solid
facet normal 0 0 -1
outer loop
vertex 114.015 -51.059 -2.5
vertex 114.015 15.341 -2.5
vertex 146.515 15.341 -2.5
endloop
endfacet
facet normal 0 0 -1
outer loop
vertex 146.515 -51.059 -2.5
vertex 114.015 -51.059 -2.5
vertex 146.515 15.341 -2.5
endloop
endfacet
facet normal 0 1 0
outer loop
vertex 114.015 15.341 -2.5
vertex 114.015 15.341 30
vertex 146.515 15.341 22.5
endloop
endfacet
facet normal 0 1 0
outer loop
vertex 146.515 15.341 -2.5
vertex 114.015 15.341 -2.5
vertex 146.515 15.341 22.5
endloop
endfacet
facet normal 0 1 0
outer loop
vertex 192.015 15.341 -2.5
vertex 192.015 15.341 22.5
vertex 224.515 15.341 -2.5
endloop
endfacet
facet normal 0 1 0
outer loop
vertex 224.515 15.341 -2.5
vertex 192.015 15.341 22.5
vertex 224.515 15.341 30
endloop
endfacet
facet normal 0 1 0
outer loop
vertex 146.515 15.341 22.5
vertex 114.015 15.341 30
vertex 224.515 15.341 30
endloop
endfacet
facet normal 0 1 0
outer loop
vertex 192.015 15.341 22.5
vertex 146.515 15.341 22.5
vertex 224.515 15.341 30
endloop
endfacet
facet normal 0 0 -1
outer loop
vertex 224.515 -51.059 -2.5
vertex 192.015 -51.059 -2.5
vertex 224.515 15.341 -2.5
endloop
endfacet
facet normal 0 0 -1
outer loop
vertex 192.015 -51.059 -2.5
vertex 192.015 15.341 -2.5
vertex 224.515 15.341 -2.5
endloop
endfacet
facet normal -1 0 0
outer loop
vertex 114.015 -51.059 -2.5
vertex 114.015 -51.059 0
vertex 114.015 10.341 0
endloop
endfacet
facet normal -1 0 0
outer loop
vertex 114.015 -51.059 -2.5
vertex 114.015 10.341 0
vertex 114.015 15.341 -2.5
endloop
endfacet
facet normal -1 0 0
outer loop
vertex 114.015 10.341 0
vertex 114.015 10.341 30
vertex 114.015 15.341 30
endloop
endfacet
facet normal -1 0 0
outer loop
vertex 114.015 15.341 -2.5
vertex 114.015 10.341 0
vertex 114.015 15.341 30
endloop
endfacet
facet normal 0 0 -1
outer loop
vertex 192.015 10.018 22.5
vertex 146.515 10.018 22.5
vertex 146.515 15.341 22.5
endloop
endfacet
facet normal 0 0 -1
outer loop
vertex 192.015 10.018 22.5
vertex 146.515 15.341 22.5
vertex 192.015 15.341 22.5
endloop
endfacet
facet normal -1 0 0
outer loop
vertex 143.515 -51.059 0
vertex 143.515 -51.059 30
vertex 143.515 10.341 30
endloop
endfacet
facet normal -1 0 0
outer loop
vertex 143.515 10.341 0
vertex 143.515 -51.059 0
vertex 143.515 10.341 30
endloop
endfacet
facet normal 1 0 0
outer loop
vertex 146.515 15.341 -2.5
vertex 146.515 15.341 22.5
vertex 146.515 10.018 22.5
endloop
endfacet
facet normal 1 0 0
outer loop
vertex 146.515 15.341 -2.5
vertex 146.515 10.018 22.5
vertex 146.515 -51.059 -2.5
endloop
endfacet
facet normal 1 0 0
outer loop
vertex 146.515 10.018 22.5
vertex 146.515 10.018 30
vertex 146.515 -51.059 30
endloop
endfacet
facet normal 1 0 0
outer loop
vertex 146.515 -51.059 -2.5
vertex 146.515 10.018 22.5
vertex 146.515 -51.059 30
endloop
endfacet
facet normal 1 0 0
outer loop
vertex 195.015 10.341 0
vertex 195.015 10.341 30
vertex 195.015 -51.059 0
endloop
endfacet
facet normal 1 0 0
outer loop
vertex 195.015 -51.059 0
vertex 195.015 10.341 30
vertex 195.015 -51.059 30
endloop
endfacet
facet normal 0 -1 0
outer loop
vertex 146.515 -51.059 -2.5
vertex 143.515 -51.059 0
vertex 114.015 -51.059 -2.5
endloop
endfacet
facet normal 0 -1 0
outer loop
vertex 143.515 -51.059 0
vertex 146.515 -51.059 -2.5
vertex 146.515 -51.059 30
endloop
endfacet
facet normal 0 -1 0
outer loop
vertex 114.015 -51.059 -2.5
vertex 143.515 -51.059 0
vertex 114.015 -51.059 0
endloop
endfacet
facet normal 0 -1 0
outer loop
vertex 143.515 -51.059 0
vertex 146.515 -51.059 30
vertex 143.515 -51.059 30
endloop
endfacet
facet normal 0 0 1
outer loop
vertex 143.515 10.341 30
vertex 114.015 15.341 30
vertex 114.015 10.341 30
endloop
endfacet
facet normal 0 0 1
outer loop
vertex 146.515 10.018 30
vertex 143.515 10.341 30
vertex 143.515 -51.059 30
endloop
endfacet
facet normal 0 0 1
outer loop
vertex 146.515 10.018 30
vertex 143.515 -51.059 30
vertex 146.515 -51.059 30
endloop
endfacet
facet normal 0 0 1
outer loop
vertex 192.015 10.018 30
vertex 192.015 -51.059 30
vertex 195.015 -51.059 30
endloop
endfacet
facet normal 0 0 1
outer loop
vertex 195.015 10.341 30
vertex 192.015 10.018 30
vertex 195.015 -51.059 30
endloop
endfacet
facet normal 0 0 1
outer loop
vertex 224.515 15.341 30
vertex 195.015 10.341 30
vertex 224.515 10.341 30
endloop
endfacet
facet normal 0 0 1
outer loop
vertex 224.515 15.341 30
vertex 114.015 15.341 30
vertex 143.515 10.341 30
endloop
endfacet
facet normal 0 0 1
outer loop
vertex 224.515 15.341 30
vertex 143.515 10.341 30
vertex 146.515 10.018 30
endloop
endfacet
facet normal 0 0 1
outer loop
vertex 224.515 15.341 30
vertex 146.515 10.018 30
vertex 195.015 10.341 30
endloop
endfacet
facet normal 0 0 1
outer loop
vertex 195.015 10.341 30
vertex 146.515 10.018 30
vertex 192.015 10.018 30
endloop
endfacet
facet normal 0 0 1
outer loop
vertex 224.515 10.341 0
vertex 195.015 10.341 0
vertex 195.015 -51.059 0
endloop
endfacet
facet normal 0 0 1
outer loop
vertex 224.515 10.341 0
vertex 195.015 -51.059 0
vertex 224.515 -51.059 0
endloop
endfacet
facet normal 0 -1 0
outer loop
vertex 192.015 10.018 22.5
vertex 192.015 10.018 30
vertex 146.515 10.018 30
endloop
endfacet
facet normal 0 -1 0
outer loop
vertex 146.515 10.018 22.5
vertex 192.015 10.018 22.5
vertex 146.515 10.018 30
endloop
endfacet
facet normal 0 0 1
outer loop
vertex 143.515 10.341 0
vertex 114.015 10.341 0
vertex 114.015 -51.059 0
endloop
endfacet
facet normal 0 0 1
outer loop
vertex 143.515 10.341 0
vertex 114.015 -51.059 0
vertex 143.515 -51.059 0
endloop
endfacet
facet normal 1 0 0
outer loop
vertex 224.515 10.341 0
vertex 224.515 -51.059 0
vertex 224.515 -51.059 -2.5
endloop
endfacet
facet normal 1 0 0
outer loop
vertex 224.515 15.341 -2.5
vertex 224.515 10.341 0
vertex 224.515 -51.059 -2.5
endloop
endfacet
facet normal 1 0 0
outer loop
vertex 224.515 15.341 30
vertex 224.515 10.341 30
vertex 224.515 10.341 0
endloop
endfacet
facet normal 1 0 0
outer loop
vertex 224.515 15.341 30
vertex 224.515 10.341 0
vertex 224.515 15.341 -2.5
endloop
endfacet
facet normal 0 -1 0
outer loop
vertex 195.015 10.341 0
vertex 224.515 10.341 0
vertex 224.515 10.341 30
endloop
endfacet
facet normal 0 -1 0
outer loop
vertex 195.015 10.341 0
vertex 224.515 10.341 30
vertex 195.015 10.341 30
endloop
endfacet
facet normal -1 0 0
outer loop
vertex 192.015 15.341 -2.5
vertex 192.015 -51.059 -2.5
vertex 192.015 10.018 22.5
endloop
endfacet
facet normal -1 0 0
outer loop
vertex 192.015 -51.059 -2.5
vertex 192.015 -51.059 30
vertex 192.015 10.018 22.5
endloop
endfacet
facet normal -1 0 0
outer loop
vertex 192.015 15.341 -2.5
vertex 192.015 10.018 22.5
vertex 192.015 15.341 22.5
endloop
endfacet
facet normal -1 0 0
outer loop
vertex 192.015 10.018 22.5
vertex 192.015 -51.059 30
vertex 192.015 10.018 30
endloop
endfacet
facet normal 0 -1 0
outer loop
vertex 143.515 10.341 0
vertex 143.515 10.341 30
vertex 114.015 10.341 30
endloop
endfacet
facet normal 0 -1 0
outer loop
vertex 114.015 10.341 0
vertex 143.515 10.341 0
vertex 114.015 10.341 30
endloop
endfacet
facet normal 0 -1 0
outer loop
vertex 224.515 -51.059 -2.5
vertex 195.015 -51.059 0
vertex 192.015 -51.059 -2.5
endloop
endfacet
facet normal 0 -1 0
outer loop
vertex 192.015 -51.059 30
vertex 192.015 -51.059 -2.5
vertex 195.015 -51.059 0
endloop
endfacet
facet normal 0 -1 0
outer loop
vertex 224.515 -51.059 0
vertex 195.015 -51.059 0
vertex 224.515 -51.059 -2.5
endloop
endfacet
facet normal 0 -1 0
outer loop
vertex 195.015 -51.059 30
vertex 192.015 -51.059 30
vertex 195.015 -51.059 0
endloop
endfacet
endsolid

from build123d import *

# Parameters (mm, degrees)
F1_DEPTH = 6.5
F2_DEPTH = 30
F3_DEPTH = 2.5
F0_W     = 29.5
F0_H     = 61.4
F4_DEPTH = 2.5
F5_W     = 45.5
F5_H     = 5.322864
F6_DEPTH = 25


with BuildPart() as f1:
    # F0 (on Top) → F1 (new body)
    with BuildSketch(Plane.XY):
        Polygon((-58.032156, 36.652669), (-58.032156, 30.152669), (-64.532156, 30.152669), (-64.532156, 23.652669), (-58.032156, 23.652669), (-58.032156, 17.152669), (-64.532156, 17.152669), (-64.532156, 10.652669), (-58.032156, 10.652669), (-58.032156, 4.152669), (-64.532156, 4.152669), (-64.532156, -2.347331), (-58.032156, -2.347331), (-58.032156, -8.847331), (-64.532156, -8.847331), (-64.532156, -15.347331), (-58.032156, -15.347331), (-58.032156, -21.847331), (-64.532156, -21.847331), (-64.532156, -28.347331), (-58.032156, -28.347331), (-58.032156, -34.847331), (-64.532156, -34.847331), (-64.532156, -41.347331), (-58.032156, -41.347331), (-58.032156, -53.445331), (58.967844, -53.445331), (58.967844, -41.347331), (65.467844, -41.347331), (65.467844, -34.847331), (58.967844, -34.847331), (58.967844, -28.347331), (65.467844, -28.347331), (65.467844, -21.847331), (58.967844, -21.847331), (58.967844, -15.347331), (65.467844, -15.347331), (65.467844, -8.847331), (58.967844, -8.847331), (58.967844, -2.347331), (65.467844, -2.347331), (65.467844, 4.152669), (58.967844, 4.152669), (58.967844, 10.652669), (65.467844, 10.652669), (65.467844, 17.152669), (58.967844, 17.152669), (58.967844, 23.652669), (58.967844, 30.152669), (52.467844, 30.152669), (52.467844, 36.652669), (45.967844, 36.652669), (45.967844, 30.152669), (39.467844, 30.152669), (39.467844, 36.652669), (32.967844, 36.652669), (32.967844, 30.152669), (26.467844, 30.152669), (26.467844, 36.652669), (19.967844, 36.652669), (19.967844, 30.152669), (13.467844, 30.152669), (13.467844, 36.652669), (6.967844, 36.652669), (6.967844, 30.152669), (0.467844, 30.152669), (0.467844, 36.652669), (-6.032156, 36.652669), (-6.032156, 30.152669), (-12.532156, 30.152669), (-12.532156, 36.652669), (-19.032156, 36.652669), (-19.032156, 30.152669), (-25.532156, 30.152669), (-25.532156, 36.652669), (-32.032156, 36.652669), (-32.032156, 30.152669), (-38.532156, 30.152669), (-38.532156, 36.652669), (-45.032156, 36.652669), (-45.032156, 30.152669), (-51.532156, 30.152669), (-51.532156, 36.652669), align=None)
    extrude(amount=F1_DEPTH)


with BuildPart() as f2:
    # F0 (on Top) → F2 (new body)
    with BuildSketch(Plane.XY):
        Polygon((224.515274, 15.340945), (114.015274, 15.340945), (114.015274, 10.340945), (143.515274, 10.340945), (143.515274, -51.059055), (146.515274, -51.059055), (146.515274, 10.018081), (192.015274, 10.018081), (192.015274, -51.059055), (195.015274, -51.059055), (195.015274, 10.340945), (224.515274, 10.340945), align=None)
    extrude(amount=F2_DEPTH)

    # F2_face (on face) → F3 (join)
    with BuildSketch(Plane(origin=(169.265274, -0.273746, 0), x_dir=(1, 0, 0), z_dir=(0, 0, -1))):
        Polygon((55.25, -10.614691), (25.75, -10.614691), (25.75, 50.785309), (22.75, 50.785309), (22.75, -10.291827), (-22.75, -10.291827), (-22.75, 50.785309), (-25.75, 50.785309), (-25.75, -10.614691), (-55.25, -10.614691), (-55.25, -15.614691), (55.25, -15.614691), align=None)
    extrude(amount=F3_DEPTH)

    # F0 (on Top) → F4 (join)
    with BuildSketch(Plane.XY):
        with Locations((209.765274, -20.359055)):
            Rectangle(F0_W, F0_H)
        with Locations((128.765274, -20.359055)):
            Rectangle(F0_W, F0_H)
    extrude(amount=-F4_DEPTH)

    # F5 (on face) → F6 (cut)
    with BuildSketch(Plane(origin=(0, 0, -2.5), x_dir=(1, 0, 0), z_dir=(0, 0, -1))):
        with Locations((169.265274, -12.679513)):
            Rectangle(F5_W, F5_H)
    extrude(amount=-F6_DEPTH, mode=Mode.SUBTRACT)


with BuildPart() as f7_1:
    # F7: copy of F2
    add(f2.part)


solid = f7_1.part
